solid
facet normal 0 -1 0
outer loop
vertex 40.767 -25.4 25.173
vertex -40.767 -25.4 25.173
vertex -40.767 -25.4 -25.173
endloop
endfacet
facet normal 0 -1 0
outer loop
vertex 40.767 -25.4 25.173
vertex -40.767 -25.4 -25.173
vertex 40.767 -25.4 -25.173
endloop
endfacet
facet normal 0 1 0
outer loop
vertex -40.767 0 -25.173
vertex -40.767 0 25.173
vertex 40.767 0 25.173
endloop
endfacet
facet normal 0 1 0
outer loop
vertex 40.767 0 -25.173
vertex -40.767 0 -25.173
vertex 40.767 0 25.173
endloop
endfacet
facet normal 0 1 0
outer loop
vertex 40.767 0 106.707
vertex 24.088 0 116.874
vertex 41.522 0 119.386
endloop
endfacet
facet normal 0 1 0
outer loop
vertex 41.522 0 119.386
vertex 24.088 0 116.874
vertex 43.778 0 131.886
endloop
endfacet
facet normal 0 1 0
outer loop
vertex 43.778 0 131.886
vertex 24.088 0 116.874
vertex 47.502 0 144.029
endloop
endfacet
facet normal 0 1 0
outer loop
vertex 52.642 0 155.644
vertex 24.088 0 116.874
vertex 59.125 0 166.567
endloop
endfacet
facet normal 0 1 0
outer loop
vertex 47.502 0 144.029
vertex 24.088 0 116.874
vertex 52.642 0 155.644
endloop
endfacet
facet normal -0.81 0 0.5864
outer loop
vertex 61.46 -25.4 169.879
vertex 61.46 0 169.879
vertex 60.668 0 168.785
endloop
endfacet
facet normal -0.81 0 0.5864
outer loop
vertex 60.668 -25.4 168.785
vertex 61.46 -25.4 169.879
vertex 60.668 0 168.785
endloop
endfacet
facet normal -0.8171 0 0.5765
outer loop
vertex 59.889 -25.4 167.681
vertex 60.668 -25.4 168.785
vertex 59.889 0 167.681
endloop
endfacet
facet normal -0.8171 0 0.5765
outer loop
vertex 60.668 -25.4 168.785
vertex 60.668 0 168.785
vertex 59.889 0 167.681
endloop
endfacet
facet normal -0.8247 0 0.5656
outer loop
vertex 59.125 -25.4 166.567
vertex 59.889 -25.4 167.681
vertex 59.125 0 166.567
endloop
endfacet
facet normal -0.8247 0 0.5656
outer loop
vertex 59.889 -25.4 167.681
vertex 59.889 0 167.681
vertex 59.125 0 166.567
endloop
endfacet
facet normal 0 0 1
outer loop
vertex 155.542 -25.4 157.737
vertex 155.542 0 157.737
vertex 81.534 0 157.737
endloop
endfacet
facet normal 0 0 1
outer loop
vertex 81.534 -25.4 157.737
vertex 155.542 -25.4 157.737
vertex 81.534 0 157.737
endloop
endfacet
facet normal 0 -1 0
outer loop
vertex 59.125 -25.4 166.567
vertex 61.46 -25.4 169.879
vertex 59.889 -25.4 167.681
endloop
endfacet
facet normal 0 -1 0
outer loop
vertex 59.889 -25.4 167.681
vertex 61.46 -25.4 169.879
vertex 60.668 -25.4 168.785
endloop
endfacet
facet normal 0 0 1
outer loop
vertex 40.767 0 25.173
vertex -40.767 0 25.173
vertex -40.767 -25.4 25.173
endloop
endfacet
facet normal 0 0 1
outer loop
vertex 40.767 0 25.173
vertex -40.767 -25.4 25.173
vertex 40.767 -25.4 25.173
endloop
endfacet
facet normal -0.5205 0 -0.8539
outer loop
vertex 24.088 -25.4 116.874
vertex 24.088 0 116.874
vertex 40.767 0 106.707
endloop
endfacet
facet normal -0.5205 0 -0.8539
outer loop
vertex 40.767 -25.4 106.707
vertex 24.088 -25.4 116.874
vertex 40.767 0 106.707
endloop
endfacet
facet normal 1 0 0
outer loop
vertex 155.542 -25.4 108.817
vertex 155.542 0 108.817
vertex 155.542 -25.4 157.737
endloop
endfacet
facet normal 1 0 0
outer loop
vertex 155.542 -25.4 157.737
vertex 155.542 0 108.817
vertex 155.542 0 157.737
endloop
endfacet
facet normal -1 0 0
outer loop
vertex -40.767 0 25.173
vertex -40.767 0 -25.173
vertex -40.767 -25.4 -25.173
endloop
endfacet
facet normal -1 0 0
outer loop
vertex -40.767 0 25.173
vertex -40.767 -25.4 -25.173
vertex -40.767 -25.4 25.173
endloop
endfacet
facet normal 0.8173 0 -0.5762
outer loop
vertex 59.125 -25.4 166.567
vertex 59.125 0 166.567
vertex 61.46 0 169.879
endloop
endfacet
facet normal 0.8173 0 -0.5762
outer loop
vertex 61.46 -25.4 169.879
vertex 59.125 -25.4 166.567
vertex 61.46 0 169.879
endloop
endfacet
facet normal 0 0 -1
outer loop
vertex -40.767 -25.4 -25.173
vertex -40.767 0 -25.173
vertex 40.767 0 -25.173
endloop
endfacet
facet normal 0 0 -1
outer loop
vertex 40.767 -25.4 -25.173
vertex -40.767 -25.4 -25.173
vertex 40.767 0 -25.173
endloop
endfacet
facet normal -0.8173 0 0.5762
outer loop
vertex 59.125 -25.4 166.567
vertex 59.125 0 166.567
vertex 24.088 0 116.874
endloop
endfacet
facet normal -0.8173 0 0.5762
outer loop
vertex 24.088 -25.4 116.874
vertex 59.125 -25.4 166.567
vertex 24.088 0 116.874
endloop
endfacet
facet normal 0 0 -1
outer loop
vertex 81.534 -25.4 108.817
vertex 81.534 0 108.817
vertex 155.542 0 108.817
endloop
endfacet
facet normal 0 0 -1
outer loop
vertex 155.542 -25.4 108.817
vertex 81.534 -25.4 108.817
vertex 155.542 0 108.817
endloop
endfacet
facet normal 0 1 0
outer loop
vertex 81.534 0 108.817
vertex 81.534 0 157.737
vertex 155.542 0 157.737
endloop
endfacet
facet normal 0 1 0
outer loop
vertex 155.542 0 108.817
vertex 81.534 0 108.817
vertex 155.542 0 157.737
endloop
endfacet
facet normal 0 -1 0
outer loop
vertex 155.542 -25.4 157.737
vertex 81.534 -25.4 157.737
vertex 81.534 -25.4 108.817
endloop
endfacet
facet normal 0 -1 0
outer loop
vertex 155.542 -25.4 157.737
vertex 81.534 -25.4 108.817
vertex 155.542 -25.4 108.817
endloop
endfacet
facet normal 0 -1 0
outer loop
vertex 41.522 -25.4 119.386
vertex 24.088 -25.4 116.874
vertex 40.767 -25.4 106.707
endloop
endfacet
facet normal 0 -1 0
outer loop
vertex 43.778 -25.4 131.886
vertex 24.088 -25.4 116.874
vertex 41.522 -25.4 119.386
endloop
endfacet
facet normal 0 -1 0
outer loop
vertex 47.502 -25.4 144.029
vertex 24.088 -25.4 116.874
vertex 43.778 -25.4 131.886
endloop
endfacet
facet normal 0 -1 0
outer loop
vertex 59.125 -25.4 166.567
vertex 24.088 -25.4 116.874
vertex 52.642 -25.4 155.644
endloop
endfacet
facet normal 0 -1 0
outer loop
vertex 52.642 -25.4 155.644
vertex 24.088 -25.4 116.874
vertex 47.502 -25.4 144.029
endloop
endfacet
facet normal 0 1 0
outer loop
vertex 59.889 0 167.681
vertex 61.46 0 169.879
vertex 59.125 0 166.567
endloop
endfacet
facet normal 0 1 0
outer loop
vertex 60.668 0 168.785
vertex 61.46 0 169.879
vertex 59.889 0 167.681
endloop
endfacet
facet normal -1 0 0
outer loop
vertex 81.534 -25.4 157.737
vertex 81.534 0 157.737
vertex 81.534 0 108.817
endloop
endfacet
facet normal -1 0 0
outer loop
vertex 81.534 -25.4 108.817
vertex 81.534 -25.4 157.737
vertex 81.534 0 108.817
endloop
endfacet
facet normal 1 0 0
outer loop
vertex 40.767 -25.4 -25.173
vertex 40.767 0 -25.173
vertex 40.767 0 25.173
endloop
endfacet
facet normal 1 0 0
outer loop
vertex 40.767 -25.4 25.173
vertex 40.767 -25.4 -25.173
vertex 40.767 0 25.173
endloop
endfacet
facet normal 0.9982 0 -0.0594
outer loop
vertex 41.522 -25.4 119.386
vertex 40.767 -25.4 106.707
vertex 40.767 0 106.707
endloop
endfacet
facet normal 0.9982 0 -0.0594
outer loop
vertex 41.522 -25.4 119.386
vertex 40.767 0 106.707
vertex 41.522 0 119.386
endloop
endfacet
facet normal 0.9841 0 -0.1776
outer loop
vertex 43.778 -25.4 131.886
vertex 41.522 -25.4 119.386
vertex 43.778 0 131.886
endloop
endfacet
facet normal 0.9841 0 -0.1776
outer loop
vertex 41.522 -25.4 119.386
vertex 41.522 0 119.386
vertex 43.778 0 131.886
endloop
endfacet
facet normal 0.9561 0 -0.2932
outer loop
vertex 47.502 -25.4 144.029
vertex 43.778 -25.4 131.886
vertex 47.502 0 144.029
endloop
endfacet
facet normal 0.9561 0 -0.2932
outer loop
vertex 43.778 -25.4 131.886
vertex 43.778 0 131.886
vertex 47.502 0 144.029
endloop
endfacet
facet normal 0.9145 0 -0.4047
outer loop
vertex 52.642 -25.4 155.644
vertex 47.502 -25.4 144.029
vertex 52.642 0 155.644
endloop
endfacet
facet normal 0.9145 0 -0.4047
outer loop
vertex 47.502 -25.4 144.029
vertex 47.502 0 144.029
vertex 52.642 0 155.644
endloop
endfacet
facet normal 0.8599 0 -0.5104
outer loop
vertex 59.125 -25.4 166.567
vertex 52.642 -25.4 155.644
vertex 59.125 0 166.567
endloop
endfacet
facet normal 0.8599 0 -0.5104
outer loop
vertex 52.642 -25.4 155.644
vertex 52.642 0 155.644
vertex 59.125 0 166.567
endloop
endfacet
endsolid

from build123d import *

# Parameters (mm, degrees)
F0_W     = 81.534
F0_H     = 50.34545
F1_DEPTH = 25.4


with BuildPart() as f1:
    # F0 (on Front) → F1 (new body)
    with BuildSketch(Plane.XZ):
        Polygon((155.541811, 157.736965), (86.099056, 157.736965), (81.534026, 157.736965), (81.534026, 108.81655), (155.541811, 108.81655), align=None)
        with BuildLine():
            ThreePointArc((61.460019, 169.87858), (60.276794, 168.233799), (59.124993, 166.566862))
            Line((59.124993, 166.566862), (61.460019, 169.87858))
        make_face()
        with BuildLine():
            Line((24.08776, 116.874295), (40.767, 106.706725))
            ThreePointArc((40.767, 106.706725), (45.459618, 138.012682), (59.124993, 166.566862))
            Line((59.124993, 166.566862), (24.08776, 116.874295))
        make_face()
        Rectangle(F0_W, F0_H)
    extrude(amount=F1_DEPTH)


solid = f1.part
